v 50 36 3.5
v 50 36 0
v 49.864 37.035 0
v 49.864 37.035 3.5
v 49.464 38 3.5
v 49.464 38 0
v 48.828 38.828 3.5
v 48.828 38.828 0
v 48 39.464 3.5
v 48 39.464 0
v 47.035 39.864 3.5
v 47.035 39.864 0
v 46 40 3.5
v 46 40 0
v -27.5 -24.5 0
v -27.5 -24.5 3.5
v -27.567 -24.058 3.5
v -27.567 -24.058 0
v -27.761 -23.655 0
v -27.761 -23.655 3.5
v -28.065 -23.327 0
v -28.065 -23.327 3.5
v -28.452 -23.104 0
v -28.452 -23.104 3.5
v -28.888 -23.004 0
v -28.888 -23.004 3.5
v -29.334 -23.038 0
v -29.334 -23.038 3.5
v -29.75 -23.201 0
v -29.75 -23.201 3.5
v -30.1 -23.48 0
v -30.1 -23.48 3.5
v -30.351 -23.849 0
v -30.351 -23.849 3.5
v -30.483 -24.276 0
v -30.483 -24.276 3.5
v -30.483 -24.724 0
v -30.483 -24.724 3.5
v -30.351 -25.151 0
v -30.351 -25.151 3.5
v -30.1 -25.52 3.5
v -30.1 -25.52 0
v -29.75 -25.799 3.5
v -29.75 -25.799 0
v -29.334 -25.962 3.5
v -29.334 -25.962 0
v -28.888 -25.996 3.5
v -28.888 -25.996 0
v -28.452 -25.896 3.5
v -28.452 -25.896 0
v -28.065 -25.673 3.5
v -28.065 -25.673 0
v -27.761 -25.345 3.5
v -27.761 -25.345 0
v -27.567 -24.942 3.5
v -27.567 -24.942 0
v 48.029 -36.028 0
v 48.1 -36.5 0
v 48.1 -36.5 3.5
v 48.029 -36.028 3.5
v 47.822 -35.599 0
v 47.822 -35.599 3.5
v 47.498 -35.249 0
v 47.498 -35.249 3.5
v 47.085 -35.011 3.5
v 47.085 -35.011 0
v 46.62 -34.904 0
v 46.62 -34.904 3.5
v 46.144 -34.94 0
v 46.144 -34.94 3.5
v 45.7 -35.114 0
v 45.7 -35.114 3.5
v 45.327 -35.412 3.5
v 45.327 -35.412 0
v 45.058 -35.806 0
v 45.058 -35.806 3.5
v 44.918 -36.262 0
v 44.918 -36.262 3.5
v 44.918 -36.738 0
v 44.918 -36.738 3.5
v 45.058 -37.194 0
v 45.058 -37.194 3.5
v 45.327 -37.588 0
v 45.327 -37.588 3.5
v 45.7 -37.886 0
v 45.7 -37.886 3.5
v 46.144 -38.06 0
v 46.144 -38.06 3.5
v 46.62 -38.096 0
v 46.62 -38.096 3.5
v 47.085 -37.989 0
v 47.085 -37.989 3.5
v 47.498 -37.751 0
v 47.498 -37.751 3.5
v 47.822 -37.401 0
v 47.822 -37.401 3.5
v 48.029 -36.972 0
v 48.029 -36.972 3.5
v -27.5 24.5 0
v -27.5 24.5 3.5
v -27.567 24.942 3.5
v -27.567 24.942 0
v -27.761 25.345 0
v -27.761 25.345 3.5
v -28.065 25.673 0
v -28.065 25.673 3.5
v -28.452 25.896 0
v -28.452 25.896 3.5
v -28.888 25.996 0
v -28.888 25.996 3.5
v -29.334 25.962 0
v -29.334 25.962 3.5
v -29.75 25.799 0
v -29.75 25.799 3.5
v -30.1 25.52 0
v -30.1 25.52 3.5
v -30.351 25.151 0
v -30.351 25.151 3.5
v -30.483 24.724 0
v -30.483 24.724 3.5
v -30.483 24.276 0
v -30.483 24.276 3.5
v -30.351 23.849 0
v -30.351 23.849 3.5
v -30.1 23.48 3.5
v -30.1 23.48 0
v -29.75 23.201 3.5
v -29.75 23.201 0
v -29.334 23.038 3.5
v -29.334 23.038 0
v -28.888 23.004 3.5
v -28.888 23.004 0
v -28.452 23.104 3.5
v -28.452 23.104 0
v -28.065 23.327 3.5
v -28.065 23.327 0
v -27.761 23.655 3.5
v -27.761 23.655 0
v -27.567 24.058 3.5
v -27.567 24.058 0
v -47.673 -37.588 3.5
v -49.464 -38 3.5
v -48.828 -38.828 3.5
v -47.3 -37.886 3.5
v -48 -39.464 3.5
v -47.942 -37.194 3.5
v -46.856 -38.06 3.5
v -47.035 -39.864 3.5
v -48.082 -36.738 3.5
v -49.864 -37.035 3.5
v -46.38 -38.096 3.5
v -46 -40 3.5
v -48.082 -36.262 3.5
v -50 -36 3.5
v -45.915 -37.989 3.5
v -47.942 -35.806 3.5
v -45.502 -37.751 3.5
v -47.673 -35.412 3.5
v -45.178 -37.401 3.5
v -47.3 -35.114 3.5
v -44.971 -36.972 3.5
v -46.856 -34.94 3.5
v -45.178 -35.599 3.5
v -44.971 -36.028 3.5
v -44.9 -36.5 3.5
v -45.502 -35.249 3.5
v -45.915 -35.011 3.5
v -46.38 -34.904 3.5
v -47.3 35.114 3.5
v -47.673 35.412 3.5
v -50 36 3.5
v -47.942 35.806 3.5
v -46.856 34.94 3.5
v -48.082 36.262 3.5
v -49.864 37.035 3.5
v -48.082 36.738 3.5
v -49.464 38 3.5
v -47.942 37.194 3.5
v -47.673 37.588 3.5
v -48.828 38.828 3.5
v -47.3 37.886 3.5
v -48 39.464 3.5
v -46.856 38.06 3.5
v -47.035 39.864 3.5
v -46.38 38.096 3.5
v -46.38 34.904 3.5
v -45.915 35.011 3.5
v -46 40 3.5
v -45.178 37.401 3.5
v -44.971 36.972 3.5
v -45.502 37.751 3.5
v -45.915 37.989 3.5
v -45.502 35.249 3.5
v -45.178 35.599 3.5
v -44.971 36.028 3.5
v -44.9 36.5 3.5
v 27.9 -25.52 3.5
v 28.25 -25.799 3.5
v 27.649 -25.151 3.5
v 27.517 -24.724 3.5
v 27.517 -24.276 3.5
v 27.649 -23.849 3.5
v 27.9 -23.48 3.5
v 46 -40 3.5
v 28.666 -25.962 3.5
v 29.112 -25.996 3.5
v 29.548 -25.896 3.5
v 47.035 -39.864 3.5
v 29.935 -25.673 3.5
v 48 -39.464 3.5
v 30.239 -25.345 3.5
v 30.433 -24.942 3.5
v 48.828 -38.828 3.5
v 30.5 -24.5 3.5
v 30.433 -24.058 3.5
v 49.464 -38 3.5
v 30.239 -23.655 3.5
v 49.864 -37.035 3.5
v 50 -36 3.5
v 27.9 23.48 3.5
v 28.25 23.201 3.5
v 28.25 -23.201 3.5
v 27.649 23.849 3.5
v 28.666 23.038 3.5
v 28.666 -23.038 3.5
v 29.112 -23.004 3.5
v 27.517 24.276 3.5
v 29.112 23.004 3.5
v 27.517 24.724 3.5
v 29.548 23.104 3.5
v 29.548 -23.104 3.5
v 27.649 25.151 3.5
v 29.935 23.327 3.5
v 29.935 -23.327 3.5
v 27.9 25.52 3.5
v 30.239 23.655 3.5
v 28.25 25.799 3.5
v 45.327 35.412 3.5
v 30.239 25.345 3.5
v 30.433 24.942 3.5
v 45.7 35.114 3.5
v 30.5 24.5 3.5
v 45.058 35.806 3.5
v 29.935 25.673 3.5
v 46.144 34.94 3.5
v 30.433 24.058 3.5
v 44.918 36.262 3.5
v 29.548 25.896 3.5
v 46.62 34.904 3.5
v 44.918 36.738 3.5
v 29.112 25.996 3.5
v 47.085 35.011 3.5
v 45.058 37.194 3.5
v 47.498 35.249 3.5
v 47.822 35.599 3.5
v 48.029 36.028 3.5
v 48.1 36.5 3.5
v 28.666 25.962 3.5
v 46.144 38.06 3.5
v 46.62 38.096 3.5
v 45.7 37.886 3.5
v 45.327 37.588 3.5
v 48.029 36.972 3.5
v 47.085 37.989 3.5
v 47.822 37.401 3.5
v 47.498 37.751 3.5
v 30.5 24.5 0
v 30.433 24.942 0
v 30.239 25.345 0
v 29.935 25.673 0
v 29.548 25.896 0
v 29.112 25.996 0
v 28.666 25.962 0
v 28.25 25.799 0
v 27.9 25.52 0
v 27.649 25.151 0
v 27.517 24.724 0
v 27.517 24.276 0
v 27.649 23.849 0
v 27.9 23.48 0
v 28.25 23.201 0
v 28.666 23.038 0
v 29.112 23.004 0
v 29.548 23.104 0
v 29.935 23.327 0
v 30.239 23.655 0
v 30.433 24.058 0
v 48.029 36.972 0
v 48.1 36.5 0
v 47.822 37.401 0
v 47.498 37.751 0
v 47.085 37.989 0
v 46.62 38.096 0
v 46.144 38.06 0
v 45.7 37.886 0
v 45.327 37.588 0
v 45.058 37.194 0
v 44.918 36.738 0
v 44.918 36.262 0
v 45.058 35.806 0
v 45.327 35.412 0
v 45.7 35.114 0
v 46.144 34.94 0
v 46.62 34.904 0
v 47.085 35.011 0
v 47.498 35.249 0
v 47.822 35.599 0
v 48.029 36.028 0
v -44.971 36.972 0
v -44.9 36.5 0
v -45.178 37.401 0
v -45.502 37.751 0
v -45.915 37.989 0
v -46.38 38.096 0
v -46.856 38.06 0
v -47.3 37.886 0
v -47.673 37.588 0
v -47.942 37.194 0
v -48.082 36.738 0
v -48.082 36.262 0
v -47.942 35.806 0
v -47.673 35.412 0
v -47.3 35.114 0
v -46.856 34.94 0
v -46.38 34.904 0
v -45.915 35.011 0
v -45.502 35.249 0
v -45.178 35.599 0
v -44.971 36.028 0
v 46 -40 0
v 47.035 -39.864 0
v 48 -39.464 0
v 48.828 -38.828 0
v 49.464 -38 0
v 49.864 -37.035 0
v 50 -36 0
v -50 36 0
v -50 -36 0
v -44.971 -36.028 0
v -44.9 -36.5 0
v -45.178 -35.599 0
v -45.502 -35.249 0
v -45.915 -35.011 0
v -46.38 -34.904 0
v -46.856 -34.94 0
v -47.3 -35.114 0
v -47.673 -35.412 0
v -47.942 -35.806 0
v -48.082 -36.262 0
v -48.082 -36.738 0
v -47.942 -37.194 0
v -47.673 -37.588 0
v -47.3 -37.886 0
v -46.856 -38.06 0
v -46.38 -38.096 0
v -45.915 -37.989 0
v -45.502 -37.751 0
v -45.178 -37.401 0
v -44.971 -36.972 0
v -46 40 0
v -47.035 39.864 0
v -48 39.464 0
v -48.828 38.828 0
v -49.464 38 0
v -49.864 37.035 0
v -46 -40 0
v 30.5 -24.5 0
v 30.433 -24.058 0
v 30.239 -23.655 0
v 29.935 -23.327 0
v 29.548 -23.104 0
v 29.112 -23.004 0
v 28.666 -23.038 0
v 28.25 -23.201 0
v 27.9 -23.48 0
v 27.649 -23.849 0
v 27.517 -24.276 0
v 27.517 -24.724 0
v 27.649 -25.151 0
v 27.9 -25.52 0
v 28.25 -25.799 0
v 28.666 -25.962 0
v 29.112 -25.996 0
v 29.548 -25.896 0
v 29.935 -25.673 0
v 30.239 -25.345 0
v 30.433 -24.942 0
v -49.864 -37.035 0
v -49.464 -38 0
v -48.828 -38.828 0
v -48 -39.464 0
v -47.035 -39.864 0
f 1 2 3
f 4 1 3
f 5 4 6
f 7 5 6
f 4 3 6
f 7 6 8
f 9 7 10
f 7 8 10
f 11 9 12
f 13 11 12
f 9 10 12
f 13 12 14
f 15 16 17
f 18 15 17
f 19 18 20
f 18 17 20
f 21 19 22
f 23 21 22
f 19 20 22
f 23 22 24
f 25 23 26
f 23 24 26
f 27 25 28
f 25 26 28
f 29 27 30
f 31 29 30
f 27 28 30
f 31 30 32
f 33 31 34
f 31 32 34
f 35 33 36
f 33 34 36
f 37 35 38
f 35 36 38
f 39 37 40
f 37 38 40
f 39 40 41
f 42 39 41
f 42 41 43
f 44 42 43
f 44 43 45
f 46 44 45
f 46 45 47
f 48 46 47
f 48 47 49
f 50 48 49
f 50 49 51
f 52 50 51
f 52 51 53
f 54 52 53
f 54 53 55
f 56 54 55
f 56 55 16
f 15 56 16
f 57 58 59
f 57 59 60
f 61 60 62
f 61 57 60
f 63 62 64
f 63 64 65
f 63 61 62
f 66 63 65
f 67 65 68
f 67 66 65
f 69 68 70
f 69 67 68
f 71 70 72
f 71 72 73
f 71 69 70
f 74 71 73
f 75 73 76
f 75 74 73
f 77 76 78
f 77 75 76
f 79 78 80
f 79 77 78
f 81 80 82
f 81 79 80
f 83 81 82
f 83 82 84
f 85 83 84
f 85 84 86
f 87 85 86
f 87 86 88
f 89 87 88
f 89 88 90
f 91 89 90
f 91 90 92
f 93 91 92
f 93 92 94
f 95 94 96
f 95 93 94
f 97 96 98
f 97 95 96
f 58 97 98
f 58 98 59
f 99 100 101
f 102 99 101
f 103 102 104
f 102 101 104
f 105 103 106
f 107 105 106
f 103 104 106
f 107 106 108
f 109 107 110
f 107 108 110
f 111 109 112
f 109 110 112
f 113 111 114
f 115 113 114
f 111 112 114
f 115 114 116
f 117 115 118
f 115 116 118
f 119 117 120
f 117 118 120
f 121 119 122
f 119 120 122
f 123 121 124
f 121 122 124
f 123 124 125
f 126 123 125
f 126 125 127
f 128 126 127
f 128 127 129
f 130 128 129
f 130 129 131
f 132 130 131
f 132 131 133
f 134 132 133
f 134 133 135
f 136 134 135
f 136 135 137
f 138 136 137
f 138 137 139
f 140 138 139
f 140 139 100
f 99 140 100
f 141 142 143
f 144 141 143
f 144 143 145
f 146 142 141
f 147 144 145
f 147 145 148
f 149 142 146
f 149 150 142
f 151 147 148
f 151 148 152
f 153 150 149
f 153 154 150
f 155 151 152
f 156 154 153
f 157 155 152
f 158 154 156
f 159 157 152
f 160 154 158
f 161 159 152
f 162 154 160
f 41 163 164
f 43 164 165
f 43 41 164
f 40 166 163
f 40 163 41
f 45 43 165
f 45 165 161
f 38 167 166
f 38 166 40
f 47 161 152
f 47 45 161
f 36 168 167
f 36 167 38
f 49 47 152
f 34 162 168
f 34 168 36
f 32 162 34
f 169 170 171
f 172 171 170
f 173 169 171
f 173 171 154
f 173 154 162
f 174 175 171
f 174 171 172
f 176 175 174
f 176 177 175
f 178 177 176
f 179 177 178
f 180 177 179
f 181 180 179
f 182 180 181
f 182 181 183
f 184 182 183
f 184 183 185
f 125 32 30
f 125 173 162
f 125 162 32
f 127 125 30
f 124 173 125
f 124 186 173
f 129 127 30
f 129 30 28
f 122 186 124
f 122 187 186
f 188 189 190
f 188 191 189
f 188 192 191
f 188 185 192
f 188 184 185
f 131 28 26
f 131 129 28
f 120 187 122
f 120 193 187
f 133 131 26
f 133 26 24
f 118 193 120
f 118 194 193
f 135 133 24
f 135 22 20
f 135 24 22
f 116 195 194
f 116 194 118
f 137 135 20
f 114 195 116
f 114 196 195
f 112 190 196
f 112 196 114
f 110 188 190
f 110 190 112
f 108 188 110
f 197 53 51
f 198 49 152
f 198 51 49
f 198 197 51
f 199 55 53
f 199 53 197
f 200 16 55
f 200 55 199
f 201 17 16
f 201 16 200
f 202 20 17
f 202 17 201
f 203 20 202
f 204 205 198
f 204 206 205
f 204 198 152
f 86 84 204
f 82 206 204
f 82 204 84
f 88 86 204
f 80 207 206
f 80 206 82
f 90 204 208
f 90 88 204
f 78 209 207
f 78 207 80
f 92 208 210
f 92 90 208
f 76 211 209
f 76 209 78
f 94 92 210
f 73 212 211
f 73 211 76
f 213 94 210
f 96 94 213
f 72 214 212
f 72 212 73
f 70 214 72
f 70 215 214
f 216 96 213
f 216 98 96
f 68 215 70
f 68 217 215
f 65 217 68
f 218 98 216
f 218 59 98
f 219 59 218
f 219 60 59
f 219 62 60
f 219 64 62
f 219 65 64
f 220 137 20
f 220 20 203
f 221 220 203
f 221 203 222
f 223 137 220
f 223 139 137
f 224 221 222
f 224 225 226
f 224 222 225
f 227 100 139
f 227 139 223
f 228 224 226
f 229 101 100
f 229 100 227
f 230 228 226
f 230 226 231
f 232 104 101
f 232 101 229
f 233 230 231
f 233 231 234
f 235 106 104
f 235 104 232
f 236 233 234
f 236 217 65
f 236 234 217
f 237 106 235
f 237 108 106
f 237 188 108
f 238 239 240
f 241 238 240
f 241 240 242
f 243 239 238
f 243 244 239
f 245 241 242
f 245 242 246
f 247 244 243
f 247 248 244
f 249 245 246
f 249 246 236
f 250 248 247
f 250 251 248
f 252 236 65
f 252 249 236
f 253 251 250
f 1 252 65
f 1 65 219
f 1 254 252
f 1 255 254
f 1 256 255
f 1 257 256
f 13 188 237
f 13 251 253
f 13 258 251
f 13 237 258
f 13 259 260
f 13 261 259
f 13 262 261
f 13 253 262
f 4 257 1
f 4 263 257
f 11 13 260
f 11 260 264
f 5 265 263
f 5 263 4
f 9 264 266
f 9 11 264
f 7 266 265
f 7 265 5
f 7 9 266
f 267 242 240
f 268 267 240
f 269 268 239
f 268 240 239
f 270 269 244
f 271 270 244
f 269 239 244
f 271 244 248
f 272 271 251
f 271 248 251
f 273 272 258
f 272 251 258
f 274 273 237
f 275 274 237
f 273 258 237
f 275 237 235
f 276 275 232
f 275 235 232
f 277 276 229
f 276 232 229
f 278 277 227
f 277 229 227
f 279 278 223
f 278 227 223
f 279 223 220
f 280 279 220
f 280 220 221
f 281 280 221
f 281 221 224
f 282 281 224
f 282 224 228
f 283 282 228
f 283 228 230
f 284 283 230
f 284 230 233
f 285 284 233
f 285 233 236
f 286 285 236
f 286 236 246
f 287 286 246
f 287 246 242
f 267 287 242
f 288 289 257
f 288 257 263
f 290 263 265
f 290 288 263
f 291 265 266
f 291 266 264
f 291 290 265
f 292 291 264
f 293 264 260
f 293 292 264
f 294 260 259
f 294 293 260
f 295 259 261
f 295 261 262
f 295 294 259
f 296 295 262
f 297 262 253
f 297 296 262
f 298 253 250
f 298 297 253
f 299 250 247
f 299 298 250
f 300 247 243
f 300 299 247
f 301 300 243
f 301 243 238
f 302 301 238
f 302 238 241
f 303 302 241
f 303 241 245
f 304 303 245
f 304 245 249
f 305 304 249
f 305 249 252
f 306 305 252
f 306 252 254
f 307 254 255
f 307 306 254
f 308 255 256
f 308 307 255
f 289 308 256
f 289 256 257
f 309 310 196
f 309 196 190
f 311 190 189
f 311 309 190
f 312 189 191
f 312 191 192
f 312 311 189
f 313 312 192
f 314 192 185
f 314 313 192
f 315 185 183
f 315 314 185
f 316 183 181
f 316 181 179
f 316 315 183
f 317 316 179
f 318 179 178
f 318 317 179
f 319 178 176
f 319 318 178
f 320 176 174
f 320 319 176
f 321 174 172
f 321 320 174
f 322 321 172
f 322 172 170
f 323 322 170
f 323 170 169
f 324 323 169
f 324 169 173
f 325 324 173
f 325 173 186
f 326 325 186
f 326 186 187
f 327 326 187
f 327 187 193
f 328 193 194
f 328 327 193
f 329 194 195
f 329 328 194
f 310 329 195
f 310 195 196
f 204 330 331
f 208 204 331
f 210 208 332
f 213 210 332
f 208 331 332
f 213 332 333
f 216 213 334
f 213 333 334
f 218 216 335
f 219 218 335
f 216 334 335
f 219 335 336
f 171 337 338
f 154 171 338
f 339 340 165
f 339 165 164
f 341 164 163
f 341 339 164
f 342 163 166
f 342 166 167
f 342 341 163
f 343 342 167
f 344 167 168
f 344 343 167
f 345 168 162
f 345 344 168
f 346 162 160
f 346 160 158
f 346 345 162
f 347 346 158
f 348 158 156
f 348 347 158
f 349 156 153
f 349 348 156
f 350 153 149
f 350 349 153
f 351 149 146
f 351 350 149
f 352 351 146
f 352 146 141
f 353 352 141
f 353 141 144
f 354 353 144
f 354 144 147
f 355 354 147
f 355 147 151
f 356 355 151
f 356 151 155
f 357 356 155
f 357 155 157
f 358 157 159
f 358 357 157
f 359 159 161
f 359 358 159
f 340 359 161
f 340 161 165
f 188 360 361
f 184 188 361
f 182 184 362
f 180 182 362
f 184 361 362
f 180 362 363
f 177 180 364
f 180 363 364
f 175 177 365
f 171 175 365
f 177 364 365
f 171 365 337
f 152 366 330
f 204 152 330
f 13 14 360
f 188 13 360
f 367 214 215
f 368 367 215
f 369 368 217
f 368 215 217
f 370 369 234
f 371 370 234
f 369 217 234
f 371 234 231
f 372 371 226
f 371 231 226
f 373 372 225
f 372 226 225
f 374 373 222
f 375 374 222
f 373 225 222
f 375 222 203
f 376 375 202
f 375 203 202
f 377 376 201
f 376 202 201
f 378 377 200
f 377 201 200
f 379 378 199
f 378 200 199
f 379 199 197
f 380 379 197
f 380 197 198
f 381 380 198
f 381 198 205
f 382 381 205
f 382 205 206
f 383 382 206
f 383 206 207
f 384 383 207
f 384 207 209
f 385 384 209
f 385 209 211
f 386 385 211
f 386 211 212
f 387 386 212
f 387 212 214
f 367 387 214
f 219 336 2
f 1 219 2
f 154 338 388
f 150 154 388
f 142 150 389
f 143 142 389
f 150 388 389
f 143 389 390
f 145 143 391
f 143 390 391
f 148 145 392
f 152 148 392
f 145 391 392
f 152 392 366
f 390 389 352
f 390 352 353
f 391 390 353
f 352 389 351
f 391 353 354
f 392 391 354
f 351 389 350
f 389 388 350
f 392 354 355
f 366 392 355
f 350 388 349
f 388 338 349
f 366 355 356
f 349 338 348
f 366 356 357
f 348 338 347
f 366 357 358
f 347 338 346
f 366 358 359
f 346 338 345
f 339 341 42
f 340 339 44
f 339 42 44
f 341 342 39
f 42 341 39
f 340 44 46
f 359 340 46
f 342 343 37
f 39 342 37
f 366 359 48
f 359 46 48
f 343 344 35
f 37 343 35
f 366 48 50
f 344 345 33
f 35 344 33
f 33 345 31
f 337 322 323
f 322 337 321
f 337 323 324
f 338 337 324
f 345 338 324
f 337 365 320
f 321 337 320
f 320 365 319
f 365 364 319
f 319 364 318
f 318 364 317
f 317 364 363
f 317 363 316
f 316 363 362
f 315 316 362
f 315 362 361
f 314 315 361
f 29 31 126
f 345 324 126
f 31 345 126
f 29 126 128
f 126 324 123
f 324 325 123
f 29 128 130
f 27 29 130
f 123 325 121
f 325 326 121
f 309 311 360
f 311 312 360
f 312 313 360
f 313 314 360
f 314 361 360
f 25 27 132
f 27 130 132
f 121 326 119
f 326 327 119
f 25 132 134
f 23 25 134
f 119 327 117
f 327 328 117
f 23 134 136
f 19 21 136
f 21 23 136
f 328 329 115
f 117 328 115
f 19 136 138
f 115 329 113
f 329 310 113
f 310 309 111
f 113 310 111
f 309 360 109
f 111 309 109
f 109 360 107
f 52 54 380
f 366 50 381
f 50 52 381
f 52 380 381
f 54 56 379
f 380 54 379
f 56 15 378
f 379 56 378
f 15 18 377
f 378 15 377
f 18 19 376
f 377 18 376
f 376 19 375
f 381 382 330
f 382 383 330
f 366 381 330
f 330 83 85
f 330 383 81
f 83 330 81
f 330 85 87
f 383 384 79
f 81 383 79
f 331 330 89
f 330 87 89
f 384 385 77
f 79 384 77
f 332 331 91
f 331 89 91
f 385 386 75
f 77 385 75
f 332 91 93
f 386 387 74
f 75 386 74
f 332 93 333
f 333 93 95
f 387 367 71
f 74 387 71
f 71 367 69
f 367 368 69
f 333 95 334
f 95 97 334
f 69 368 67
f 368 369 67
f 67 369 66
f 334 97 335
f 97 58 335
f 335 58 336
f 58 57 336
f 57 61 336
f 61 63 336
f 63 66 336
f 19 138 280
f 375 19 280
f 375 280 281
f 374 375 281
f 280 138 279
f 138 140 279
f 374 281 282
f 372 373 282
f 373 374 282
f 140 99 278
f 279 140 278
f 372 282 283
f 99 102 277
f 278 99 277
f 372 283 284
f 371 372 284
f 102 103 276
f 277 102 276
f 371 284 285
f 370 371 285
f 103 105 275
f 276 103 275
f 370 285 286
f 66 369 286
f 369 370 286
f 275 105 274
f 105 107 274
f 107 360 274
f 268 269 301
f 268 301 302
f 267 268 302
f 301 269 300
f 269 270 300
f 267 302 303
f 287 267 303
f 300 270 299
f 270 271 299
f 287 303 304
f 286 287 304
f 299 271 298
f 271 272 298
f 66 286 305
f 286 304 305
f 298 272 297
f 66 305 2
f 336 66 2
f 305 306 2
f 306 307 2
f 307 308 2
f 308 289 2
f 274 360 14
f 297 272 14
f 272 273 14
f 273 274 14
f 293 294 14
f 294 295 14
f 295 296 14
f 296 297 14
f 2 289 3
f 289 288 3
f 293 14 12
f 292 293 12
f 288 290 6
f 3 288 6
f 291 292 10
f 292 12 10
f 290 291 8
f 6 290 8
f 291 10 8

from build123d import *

# Parameters (mm, degrees)
SKETCH2_R           = 1.6
BOSS_EXTRUDE1_DEPTH = 3.5
SKETCH3_R           = 1.5
CUT_EXTRUDE1_DEPTH  = 8


with BuildPart() as part:
    # Sketch2 → Boss-Extrude1 (new body)
    with BuildSketch(Plane.XY):
        with BuildLine():
            Line((-46, -40), (46, -40))
            ThreePointArc((46, -40), (48.828427125, -38.828427125), (50, -36))
            Line((50, -36), (50, 36))
            ThreePointArc((50, 36), (48.828427125, 38.828427125), (46, 40))
            Line((46, 40), (-46, 40))
            ThreePointArc((-46, 40), (-48.828427125, 38.828427125), (-50, 36))
            Line((-50, 36), (-50, -36))
            ThreePointArc((-50, -36), (-48.828427125, -38.828427125), (-46, -40))
        make_face()
        with Locations((-46.5, 36.5)):
            Circle(SKETCH2_R, mode=Mode.SUBTRACT)
        with Locations((46.5, 36.5)):
            Circle(SKETCH2_R, mode=Mode.SUBTRACT)
        with Locations((-46.5, -36.5)):
            Circle(SKETCH2_R, mode=Mode.SUBTRACT)
        with Locations((46.5, -36.5)):
            Circle(SKETCH2_R, mode=Mode.SUBTRACT)
    extrude(amount=BOSS_EXTRUDE1_DEPTH)

    # Sketch3 → Cut-Extrude1 (cut)
    with BuildSketch(Plane.XY.offset(3.5)):
        with Locations((-29, 24.5)):
            Circle(SKETCH3_R)
        with Locations((-29, -24.5)):
            Circle(SKETCH3_R)
        with Locations((29, -24.5)):
            Circle(SKETCH3_R)
        with Locations((29, 24.5)):
            Circle(SKETCH3_R)
    extrude(amount=-CUT_EXTRUDE1_DEPTH, mode=Mode.SUBTRACT)


solid = part.part
